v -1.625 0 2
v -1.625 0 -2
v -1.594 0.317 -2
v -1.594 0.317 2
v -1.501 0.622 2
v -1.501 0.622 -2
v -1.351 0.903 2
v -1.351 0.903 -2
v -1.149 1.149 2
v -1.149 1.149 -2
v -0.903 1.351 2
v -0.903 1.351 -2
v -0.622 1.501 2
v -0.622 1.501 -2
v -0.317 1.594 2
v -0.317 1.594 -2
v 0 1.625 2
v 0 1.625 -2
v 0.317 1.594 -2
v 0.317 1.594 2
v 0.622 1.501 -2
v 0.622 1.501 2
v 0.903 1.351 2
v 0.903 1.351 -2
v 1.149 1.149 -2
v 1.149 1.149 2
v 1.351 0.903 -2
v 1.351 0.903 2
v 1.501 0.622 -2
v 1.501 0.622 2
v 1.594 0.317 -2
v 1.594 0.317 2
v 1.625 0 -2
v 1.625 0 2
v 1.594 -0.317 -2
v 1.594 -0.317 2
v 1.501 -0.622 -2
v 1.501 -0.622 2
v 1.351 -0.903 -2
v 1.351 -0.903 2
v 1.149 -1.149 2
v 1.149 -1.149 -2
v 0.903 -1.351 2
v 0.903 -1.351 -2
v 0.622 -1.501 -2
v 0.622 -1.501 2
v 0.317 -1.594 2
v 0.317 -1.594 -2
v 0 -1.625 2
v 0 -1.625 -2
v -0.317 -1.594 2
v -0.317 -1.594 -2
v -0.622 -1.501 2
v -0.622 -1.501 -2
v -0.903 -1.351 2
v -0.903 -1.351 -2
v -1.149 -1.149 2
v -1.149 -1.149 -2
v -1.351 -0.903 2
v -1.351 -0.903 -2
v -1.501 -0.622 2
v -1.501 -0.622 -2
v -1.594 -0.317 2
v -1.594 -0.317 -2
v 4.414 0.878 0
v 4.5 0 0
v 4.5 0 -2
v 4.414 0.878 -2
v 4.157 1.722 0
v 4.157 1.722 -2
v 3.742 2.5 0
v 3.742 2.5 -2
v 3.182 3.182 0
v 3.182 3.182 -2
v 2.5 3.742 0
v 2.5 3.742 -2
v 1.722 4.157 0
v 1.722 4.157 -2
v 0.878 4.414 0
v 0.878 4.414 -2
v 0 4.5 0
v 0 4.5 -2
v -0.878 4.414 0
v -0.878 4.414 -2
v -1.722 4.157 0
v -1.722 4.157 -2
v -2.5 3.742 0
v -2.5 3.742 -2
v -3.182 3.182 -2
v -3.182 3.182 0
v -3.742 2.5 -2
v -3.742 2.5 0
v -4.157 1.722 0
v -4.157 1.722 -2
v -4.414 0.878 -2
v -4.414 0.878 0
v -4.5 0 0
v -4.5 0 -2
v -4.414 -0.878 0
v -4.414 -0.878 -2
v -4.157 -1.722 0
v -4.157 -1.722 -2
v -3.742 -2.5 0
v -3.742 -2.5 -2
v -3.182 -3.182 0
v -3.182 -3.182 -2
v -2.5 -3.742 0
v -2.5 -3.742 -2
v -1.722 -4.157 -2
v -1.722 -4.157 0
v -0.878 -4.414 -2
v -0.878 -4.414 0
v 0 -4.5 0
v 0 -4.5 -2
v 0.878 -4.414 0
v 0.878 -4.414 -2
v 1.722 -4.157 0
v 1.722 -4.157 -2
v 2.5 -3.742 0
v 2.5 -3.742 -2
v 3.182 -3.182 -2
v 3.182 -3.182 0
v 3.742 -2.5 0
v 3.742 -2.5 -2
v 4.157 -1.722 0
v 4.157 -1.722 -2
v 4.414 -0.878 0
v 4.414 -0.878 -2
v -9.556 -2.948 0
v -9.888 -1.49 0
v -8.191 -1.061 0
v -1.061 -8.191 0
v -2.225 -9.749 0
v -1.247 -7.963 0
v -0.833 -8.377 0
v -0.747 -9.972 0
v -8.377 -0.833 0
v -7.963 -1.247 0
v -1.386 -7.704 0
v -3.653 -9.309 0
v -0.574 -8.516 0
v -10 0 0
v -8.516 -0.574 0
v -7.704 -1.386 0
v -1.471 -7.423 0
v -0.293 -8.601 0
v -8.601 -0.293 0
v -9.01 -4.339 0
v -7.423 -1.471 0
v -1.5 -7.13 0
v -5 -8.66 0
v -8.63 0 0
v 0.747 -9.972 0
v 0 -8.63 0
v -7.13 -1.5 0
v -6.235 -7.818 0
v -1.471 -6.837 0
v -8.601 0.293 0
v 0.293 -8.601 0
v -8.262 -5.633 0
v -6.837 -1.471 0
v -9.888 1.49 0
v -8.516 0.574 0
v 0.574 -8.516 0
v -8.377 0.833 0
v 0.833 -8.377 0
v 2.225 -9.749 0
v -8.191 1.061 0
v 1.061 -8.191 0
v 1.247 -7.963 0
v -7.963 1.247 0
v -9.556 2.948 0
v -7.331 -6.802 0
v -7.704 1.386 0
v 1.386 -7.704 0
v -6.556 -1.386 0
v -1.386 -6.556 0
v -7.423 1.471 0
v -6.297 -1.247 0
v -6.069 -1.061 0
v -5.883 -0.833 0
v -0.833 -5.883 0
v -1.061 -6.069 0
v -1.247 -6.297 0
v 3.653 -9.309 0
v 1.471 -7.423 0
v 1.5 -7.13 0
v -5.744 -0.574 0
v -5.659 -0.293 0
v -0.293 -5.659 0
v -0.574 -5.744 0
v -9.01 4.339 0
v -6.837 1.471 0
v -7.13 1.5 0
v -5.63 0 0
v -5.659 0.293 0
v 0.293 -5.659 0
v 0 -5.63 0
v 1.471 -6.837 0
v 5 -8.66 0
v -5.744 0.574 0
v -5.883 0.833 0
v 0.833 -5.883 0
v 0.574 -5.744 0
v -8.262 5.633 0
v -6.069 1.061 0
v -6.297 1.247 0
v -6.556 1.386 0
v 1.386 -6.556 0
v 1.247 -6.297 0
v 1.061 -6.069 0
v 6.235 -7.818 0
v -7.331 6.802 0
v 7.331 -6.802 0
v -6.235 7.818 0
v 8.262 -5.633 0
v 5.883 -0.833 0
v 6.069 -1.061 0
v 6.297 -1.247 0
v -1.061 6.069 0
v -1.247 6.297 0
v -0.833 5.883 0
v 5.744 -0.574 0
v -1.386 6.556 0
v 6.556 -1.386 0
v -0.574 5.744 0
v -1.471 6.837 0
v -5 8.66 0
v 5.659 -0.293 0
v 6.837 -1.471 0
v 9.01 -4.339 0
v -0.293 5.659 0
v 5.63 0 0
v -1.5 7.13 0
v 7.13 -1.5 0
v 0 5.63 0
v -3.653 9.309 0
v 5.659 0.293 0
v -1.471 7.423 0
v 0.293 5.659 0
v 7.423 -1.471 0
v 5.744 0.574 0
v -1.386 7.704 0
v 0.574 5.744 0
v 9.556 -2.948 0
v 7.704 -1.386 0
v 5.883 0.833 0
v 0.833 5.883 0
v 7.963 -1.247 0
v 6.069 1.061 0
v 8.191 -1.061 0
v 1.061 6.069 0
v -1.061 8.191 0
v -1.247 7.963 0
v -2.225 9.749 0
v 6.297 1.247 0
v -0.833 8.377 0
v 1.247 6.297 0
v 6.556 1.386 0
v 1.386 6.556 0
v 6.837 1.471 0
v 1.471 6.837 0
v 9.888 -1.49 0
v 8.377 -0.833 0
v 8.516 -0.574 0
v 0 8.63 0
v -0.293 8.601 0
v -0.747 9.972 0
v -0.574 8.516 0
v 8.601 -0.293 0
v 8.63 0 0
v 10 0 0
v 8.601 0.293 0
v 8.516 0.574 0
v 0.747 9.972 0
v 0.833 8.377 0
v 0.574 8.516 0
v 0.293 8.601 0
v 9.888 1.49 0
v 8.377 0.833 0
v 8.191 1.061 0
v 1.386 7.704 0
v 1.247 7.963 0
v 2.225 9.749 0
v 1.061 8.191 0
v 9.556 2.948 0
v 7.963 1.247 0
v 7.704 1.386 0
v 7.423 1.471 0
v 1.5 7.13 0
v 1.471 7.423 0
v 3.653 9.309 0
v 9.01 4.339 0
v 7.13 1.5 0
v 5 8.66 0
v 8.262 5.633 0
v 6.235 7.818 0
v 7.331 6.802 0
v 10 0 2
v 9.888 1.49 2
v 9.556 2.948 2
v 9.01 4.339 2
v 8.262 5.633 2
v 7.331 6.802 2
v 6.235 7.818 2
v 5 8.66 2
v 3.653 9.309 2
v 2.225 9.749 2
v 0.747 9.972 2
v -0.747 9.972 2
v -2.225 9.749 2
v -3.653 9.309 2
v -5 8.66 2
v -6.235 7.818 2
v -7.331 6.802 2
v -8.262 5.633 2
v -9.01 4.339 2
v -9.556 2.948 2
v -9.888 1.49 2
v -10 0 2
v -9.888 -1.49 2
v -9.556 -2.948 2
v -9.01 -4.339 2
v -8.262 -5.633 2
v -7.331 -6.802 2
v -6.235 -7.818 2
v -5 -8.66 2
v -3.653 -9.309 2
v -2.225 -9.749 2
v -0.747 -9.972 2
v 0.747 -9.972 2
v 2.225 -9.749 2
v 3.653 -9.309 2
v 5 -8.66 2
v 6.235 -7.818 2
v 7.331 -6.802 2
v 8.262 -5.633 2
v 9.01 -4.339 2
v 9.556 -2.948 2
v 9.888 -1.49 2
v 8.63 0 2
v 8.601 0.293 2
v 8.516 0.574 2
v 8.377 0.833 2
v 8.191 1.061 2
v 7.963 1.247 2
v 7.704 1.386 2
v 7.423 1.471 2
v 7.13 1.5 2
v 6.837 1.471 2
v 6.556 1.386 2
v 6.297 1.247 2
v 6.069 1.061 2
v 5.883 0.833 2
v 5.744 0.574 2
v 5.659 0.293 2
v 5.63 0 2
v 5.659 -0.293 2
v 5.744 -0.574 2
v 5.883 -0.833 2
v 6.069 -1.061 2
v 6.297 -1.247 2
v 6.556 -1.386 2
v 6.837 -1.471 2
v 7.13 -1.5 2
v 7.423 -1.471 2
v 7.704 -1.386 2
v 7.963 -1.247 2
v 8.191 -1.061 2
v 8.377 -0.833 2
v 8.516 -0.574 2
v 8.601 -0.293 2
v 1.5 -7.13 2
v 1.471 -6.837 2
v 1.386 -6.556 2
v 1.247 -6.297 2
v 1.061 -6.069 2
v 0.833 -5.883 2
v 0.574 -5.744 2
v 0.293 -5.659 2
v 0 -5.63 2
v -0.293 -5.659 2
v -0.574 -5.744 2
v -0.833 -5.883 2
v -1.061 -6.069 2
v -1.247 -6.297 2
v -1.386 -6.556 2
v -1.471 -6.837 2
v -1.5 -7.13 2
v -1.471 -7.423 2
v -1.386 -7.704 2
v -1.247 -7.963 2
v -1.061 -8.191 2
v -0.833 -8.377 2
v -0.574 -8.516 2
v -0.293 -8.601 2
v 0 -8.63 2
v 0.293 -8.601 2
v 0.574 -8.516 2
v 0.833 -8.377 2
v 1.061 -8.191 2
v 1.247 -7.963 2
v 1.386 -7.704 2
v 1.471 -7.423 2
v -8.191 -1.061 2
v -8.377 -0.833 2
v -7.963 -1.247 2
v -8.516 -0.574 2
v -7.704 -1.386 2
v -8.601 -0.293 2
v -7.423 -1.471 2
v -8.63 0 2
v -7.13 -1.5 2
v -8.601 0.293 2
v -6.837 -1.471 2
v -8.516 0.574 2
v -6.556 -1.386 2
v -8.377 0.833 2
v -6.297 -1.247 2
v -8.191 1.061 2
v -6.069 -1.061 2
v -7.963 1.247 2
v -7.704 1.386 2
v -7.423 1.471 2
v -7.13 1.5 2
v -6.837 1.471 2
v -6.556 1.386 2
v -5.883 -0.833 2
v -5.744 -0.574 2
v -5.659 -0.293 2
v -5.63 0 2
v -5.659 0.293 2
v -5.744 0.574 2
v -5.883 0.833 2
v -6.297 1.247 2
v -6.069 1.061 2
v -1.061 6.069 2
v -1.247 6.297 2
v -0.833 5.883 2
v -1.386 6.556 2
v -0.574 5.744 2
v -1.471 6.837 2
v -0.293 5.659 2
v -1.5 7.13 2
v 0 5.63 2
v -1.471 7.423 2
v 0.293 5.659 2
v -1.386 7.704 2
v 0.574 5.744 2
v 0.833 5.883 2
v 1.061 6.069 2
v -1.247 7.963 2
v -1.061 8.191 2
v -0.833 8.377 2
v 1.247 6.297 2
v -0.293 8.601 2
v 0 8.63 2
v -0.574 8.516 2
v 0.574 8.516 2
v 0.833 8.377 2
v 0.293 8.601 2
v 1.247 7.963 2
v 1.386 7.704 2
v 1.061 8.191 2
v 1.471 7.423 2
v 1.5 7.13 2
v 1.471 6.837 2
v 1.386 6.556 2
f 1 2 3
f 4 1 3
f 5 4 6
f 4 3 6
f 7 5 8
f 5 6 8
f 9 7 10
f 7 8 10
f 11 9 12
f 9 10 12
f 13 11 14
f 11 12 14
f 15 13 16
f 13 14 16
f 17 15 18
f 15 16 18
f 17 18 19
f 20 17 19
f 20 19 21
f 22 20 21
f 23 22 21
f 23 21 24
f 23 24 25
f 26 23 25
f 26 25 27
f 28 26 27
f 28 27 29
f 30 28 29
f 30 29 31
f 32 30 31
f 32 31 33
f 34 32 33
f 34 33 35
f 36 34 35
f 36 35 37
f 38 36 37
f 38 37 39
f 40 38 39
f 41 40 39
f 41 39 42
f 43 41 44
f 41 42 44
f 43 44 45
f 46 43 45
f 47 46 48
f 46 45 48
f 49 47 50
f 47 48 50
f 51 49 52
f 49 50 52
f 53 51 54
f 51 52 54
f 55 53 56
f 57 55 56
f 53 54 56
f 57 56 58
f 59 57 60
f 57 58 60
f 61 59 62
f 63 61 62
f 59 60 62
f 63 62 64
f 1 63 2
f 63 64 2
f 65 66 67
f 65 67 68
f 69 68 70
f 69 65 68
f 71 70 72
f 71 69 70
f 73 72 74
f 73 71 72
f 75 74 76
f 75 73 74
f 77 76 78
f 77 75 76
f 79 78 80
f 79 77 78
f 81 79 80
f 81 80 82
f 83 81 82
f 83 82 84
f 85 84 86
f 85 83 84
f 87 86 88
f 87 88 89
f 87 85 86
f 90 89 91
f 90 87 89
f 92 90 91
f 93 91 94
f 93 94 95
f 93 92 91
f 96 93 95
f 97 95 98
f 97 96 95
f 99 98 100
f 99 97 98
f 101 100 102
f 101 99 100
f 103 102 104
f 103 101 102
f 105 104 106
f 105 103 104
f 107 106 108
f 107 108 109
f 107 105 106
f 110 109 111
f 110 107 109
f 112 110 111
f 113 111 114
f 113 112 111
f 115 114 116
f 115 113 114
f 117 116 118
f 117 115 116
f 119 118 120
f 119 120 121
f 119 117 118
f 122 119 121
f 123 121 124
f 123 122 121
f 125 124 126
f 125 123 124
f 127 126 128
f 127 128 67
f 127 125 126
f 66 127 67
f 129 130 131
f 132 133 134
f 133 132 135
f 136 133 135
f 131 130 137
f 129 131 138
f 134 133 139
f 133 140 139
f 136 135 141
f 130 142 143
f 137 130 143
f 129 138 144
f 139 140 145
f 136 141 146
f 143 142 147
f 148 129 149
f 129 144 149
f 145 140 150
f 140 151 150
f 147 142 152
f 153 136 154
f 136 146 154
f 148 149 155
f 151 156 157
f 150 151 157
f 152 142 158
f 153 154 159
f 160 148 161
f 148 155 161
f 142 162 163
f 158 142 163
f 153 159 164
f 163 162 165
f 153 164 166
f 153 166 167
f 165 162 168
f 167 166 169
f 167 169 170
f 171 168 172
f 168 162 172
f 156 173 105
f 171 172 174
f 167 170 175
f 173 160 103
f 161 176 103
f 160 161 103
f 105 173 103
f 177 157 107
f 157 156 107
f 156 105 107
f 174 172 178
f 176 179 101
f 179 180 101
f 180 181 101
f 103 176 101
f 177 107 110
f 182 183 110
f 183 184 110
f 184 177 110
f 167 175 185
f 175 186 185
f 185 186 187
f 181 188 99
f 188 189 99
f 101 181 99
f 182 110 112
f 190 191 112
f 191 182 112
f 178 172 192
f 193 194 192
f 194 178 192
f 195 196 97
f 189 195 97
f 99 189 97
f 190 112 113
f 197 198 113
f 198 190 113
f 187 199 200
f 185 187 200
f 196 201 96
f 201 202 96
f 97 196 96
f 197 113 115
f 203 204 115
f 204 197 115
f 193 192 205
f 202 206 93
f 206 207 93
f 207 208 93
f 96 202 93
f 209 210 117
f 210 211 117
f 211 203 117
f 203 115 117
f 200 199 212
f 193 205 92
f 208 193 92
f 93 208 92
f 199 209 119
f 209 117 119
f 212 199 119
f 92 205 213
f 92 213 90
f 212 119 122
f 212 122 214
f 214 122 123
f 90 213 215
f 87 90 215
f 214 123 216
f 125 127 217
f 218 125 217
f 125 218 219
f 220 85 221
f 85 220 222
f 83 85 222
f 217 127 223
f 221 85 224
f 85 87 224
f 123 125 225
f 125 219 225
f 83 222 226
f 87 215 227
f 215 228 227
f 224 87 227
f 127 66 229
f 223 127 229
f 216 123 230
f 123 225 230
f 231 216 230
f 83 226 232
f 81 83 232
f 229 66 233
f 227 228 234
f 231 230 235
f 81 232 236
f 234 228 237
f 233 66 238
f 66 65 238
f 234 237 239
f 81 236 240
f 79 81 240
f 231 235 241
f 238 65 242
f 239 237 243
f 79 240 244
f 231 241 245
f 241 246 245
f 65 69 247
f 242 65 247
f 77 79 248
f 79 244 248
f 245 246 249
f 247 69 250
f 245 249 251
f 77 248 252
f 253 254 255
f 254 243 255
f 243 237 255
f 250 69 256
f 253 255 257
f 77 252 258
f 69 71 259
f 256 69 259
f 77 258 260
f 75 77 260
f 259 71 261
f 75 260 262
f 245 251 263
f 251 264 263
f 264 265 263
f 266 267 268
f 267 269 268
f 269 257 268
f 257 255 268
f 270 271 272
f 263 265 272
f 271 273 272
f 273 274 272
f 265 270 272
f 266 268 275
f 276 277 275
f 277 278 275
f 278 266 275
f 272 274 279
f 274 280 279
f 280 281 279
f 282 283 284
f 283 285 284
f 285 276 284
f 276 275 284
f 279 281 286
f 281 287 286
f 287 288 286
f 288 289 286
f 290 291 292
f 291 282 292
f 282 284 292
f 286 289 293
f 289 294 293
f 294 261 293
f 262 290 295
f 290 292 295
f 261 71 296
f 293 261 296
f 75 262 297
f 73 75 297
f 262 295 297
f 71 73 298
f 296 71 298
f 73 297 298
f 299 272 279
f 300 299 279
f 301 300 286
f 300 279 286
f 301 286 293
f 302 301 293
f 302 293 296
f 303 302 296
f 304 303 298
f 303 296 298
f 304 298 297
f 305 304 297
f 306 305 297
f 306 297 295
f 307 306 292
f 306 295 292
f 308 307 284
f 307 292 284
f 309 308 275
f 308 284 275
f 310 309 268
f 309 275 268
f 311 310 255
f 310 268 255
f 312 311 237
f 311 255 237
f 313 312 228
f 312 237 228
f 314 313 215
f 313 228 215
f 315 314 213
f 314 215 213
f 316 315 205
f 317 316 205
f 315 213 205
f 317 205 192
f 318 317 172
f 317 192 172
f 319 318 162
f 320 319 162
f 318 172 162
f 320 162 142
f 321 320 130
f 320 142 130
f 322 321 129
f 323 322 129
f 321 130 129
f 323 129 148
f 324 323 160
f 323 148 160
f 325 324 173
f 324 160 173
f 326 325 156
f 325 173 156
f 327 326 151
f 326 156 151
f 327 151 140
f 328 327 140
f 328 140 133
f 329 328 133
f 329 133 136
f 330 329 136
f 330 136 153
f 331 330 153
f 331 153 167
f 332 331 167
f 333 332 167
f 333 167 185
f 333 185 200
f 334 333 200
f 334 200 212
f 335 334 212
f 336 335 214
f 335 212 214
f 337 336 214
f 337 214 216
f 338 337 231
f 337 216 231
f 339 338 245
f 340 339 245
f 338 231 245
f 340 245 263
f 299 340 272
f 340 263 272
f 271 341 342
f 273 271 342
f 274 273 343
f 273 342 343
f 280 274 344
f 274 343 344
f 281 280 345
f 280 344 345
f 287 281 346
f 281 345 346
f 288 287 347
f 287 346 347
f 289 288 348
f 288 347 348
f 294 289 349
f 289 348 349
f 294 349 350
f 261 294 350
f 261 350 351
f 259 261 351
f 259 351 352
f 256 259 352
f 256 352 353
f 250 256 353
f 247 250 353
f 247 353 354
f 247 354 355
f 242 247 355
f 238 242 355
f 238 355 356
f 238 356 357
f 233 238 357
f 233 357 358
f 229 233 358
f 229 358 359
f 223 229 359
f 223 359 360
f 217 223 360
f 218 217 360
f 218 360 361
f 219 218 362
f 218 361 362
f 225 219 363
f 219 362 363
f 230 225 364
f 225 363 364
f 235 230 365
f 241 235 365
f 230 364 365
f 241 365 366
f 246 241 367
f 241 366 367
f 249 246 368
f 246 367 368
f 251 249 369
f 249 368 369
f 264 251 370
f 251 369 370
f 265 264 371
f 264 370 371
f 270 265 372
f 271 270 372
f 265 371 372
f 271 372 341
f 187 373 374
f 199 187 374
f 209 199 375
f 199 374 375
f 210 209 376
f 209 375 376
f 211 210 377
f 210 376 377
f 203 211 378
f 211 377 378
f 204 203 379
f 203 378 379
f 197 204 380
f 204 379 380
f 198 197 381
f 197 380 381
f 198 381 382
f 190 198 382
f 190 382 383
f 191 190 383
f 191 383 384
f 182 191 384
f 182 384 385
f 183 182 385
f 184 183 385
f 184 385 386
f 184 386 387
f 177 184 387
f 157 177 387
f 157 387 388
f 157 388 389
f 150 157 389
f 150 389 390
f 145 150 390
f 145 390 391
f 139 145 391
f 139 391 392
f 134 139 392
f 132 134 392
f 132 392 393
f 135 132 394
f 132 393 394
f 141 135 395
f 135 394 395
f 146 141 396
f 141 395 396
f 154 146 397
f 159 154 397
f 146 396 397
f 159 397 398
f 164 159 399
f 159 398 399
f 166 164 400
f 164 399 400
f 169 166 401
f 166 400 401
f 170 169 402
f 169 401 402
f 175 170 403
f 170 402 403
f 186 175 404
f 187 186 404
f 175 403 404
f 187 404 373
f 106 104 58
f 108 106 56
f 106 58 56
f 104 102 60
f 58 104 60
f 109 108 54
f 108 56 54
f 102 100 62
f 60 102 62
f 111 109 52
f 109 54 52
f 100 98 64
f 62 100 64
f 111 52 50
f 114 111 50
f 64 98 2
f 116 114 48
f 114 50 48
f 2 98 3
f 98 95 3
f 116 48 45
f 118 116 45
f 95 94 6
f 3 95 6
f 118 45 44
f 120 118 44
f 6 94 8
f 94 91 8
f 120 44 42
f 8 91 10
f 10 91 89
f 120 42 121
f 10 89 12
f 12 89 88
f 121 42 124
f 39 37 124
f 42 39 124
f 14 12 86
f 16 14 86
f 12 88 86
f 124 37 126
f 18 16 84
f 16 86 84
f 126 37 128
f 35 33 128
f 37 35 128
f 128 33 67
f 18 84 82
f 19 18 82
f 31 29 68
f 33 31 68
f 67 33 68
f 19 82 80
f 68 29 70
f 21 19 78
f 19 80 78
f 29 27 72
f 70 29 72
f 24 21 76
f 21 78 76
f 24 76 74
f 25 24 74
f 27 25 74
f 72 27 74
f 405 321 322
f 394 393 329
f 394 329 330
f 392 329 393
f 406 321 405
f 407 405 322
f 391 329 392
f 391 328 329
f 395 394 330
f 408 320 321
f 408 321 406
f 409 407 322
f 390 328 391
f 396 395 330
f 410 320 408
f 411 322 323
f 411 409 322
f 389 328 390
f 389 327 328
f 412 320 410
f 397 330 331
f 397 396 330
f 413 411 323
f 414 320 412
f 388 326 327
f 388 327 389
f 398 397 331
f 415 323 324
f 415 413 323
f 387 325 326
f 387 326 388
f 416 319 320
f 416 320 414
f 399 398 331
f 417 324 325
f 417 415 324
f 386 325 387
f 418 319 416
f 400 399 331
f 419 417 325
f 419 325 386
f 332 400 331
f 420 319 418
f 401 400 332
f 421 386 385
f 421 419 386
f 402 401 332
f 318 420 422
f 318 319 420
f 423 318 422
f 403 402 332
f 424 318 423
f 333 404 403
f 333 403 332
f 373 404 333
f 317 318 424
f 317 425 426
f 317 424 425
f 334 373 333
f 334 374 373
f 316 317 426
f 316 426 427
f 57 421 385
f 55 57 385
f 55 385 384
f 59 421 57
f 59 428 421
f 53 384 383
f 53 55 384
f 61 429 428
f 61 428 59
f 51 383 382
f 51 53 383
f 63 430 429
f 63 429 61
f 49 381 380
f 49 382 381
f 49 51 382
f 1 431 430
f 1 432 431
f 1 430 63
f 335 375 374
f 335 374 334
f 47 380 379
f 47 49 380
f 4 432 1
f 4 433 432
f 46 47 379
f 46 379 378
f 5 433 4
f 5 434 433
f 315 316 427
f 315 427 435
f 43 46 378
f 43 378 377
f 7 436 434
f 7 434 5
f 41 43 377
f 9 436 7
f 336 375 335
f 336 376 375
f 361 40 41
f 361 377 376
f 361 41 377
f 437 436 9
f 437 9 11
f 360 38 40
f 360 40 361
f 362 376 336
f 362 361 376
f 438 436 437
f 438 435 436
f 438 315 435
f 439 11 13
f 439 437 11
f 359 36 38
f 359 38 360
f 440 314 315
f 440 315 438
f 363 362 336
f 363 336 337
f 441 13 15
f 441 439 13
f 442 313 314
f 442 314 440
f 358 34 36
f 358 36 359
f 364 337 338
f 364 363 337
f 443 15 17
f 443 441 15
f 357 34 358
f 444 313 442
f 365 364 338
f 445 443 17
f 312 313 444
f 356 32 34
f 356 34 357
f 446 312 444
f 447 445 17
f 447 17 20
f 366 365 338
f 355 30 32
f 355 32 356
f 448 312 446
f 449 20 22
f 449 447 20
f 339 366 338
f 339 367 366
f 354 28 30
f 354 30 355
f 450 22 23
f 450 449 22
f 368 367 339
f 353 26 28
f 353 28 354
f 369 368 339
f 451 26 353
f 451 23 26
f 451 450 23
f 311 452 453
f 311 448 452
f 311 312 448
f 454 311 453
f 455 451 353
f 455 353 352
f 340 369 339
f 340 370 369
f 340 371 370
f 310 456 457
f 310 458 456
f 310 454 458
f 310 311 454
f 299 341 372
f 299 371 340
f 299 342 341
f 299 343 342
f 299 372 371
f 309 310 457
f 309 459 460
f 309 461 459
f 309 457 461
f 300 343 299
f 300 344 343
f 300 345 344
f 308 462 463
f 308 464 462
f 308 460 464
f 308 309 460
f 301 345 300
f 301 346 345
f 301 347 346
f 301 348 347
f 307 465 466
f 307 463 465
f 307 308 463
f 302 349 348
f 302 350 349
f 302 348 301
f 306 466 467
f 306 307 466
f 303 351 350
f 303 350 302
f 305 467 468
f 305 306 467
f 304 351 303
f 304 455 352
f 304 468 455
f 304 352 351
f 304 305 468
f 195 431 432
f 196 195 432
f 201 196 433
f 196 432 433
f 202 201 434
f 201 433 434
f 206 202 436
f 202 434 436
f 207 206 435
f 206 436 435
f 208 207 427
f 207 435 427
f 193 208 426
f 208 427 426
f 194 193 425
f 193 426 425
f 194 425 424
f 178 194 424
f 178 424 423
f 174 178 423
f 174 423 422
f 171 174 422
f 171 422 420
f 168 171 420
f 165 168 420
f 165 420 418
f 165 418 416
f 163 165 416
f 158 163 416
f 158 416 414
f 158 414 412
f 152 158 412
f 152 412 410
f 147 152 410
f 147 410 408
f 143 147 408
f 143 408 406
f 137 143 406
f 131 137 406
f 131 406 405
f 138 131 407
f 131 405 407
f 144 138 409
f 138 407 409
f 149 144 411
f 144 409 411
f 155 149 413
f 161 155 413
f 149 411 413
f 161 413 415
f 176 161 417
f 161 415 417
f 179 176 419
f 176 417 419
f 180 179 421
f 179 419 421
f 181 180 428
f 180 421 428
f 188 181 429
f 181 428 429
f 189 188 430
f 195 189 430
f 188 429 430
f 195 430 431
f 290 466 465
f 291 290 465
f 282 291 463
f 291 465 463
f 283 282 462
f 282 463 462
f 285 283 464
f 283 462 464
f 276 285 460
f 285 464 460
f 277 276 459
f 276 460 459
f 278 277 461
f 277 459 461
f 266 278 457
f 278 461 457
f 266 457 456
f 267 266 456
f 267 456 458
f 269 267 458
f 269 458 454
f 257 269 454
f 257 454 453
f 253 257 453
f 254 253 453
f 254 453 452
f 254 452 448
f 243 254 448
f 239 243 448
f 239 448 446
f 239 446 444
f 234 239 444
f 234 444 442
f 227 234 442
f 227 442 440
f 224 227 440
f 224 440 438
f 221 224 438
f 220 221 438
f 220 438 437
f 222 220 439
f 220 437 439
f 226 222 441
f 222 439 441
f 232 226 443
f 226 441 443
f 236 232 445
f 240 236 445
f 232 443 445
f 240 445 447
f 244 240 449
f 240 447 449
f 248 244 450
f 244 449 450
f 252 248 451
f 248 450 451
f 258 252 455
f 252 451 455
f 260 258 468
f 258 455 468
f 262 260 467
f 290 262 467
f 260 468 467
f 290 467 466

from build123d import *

# Parameters (mm, degrees)
SCHIZZO14_R                  = 10
ESTRUSIONE_ESTRUSIONE2_DEPTH = 2
FORO_3_0_3_1_D               = 3
SCHIZZO19_R                  = 4.5
ESTRUSIONE_ESTRUSIONE3_DEPTH = 2
SCHIZZO20_R                  = 1.625
TAGLIO_ESTRUSIONE1_DEPTH     = 5


with BuildPart() as part:
    # Schizzo14 → Estrusione-Estrusione2 (new body)
    with BuildSketch(Plane.XY):
        Circle(SCHIZZO14_R)
    extrude(amount=ESTRUSIONE_ESTRUSIONE2_DEPTH)

    # Foro Ø3.0 (3)-1 (through all)
    with Locations(Plane(origin=(7.13, 0, 0), x_dir=(-1, 0, 0), z_dir=(0, 0, -1))):
        with Locations((0, 0), (14.26, 0), (7.13, -7.13), (7.13, 7.13)):
            Hole(FORO_3_0_3_1_D / 2)

    # Schizzo19 → Estrusione-Estrusione3 (add)
    with BuildSketch(Plane.XY):
        Circle(SCHIZZO19_R)
    extrude(amount=-ESTRUSIONE_ESTRUSIONE3_DEPTH)

    # Schizzo20 → Taglio-Estrusione1 (cut, through all)
    with BuildSketch(Plane(origin=(0, 0, -2), x_dir=(-1, 0, 0), z_dir=(0, 0, -1))):
        Circle(SCHIZZO20_R)
    extrude(amount=-TAGLIO_ESTRUSIONE1_DEPTH, mode=Mode.SUBTRACT)


solid = part.part
